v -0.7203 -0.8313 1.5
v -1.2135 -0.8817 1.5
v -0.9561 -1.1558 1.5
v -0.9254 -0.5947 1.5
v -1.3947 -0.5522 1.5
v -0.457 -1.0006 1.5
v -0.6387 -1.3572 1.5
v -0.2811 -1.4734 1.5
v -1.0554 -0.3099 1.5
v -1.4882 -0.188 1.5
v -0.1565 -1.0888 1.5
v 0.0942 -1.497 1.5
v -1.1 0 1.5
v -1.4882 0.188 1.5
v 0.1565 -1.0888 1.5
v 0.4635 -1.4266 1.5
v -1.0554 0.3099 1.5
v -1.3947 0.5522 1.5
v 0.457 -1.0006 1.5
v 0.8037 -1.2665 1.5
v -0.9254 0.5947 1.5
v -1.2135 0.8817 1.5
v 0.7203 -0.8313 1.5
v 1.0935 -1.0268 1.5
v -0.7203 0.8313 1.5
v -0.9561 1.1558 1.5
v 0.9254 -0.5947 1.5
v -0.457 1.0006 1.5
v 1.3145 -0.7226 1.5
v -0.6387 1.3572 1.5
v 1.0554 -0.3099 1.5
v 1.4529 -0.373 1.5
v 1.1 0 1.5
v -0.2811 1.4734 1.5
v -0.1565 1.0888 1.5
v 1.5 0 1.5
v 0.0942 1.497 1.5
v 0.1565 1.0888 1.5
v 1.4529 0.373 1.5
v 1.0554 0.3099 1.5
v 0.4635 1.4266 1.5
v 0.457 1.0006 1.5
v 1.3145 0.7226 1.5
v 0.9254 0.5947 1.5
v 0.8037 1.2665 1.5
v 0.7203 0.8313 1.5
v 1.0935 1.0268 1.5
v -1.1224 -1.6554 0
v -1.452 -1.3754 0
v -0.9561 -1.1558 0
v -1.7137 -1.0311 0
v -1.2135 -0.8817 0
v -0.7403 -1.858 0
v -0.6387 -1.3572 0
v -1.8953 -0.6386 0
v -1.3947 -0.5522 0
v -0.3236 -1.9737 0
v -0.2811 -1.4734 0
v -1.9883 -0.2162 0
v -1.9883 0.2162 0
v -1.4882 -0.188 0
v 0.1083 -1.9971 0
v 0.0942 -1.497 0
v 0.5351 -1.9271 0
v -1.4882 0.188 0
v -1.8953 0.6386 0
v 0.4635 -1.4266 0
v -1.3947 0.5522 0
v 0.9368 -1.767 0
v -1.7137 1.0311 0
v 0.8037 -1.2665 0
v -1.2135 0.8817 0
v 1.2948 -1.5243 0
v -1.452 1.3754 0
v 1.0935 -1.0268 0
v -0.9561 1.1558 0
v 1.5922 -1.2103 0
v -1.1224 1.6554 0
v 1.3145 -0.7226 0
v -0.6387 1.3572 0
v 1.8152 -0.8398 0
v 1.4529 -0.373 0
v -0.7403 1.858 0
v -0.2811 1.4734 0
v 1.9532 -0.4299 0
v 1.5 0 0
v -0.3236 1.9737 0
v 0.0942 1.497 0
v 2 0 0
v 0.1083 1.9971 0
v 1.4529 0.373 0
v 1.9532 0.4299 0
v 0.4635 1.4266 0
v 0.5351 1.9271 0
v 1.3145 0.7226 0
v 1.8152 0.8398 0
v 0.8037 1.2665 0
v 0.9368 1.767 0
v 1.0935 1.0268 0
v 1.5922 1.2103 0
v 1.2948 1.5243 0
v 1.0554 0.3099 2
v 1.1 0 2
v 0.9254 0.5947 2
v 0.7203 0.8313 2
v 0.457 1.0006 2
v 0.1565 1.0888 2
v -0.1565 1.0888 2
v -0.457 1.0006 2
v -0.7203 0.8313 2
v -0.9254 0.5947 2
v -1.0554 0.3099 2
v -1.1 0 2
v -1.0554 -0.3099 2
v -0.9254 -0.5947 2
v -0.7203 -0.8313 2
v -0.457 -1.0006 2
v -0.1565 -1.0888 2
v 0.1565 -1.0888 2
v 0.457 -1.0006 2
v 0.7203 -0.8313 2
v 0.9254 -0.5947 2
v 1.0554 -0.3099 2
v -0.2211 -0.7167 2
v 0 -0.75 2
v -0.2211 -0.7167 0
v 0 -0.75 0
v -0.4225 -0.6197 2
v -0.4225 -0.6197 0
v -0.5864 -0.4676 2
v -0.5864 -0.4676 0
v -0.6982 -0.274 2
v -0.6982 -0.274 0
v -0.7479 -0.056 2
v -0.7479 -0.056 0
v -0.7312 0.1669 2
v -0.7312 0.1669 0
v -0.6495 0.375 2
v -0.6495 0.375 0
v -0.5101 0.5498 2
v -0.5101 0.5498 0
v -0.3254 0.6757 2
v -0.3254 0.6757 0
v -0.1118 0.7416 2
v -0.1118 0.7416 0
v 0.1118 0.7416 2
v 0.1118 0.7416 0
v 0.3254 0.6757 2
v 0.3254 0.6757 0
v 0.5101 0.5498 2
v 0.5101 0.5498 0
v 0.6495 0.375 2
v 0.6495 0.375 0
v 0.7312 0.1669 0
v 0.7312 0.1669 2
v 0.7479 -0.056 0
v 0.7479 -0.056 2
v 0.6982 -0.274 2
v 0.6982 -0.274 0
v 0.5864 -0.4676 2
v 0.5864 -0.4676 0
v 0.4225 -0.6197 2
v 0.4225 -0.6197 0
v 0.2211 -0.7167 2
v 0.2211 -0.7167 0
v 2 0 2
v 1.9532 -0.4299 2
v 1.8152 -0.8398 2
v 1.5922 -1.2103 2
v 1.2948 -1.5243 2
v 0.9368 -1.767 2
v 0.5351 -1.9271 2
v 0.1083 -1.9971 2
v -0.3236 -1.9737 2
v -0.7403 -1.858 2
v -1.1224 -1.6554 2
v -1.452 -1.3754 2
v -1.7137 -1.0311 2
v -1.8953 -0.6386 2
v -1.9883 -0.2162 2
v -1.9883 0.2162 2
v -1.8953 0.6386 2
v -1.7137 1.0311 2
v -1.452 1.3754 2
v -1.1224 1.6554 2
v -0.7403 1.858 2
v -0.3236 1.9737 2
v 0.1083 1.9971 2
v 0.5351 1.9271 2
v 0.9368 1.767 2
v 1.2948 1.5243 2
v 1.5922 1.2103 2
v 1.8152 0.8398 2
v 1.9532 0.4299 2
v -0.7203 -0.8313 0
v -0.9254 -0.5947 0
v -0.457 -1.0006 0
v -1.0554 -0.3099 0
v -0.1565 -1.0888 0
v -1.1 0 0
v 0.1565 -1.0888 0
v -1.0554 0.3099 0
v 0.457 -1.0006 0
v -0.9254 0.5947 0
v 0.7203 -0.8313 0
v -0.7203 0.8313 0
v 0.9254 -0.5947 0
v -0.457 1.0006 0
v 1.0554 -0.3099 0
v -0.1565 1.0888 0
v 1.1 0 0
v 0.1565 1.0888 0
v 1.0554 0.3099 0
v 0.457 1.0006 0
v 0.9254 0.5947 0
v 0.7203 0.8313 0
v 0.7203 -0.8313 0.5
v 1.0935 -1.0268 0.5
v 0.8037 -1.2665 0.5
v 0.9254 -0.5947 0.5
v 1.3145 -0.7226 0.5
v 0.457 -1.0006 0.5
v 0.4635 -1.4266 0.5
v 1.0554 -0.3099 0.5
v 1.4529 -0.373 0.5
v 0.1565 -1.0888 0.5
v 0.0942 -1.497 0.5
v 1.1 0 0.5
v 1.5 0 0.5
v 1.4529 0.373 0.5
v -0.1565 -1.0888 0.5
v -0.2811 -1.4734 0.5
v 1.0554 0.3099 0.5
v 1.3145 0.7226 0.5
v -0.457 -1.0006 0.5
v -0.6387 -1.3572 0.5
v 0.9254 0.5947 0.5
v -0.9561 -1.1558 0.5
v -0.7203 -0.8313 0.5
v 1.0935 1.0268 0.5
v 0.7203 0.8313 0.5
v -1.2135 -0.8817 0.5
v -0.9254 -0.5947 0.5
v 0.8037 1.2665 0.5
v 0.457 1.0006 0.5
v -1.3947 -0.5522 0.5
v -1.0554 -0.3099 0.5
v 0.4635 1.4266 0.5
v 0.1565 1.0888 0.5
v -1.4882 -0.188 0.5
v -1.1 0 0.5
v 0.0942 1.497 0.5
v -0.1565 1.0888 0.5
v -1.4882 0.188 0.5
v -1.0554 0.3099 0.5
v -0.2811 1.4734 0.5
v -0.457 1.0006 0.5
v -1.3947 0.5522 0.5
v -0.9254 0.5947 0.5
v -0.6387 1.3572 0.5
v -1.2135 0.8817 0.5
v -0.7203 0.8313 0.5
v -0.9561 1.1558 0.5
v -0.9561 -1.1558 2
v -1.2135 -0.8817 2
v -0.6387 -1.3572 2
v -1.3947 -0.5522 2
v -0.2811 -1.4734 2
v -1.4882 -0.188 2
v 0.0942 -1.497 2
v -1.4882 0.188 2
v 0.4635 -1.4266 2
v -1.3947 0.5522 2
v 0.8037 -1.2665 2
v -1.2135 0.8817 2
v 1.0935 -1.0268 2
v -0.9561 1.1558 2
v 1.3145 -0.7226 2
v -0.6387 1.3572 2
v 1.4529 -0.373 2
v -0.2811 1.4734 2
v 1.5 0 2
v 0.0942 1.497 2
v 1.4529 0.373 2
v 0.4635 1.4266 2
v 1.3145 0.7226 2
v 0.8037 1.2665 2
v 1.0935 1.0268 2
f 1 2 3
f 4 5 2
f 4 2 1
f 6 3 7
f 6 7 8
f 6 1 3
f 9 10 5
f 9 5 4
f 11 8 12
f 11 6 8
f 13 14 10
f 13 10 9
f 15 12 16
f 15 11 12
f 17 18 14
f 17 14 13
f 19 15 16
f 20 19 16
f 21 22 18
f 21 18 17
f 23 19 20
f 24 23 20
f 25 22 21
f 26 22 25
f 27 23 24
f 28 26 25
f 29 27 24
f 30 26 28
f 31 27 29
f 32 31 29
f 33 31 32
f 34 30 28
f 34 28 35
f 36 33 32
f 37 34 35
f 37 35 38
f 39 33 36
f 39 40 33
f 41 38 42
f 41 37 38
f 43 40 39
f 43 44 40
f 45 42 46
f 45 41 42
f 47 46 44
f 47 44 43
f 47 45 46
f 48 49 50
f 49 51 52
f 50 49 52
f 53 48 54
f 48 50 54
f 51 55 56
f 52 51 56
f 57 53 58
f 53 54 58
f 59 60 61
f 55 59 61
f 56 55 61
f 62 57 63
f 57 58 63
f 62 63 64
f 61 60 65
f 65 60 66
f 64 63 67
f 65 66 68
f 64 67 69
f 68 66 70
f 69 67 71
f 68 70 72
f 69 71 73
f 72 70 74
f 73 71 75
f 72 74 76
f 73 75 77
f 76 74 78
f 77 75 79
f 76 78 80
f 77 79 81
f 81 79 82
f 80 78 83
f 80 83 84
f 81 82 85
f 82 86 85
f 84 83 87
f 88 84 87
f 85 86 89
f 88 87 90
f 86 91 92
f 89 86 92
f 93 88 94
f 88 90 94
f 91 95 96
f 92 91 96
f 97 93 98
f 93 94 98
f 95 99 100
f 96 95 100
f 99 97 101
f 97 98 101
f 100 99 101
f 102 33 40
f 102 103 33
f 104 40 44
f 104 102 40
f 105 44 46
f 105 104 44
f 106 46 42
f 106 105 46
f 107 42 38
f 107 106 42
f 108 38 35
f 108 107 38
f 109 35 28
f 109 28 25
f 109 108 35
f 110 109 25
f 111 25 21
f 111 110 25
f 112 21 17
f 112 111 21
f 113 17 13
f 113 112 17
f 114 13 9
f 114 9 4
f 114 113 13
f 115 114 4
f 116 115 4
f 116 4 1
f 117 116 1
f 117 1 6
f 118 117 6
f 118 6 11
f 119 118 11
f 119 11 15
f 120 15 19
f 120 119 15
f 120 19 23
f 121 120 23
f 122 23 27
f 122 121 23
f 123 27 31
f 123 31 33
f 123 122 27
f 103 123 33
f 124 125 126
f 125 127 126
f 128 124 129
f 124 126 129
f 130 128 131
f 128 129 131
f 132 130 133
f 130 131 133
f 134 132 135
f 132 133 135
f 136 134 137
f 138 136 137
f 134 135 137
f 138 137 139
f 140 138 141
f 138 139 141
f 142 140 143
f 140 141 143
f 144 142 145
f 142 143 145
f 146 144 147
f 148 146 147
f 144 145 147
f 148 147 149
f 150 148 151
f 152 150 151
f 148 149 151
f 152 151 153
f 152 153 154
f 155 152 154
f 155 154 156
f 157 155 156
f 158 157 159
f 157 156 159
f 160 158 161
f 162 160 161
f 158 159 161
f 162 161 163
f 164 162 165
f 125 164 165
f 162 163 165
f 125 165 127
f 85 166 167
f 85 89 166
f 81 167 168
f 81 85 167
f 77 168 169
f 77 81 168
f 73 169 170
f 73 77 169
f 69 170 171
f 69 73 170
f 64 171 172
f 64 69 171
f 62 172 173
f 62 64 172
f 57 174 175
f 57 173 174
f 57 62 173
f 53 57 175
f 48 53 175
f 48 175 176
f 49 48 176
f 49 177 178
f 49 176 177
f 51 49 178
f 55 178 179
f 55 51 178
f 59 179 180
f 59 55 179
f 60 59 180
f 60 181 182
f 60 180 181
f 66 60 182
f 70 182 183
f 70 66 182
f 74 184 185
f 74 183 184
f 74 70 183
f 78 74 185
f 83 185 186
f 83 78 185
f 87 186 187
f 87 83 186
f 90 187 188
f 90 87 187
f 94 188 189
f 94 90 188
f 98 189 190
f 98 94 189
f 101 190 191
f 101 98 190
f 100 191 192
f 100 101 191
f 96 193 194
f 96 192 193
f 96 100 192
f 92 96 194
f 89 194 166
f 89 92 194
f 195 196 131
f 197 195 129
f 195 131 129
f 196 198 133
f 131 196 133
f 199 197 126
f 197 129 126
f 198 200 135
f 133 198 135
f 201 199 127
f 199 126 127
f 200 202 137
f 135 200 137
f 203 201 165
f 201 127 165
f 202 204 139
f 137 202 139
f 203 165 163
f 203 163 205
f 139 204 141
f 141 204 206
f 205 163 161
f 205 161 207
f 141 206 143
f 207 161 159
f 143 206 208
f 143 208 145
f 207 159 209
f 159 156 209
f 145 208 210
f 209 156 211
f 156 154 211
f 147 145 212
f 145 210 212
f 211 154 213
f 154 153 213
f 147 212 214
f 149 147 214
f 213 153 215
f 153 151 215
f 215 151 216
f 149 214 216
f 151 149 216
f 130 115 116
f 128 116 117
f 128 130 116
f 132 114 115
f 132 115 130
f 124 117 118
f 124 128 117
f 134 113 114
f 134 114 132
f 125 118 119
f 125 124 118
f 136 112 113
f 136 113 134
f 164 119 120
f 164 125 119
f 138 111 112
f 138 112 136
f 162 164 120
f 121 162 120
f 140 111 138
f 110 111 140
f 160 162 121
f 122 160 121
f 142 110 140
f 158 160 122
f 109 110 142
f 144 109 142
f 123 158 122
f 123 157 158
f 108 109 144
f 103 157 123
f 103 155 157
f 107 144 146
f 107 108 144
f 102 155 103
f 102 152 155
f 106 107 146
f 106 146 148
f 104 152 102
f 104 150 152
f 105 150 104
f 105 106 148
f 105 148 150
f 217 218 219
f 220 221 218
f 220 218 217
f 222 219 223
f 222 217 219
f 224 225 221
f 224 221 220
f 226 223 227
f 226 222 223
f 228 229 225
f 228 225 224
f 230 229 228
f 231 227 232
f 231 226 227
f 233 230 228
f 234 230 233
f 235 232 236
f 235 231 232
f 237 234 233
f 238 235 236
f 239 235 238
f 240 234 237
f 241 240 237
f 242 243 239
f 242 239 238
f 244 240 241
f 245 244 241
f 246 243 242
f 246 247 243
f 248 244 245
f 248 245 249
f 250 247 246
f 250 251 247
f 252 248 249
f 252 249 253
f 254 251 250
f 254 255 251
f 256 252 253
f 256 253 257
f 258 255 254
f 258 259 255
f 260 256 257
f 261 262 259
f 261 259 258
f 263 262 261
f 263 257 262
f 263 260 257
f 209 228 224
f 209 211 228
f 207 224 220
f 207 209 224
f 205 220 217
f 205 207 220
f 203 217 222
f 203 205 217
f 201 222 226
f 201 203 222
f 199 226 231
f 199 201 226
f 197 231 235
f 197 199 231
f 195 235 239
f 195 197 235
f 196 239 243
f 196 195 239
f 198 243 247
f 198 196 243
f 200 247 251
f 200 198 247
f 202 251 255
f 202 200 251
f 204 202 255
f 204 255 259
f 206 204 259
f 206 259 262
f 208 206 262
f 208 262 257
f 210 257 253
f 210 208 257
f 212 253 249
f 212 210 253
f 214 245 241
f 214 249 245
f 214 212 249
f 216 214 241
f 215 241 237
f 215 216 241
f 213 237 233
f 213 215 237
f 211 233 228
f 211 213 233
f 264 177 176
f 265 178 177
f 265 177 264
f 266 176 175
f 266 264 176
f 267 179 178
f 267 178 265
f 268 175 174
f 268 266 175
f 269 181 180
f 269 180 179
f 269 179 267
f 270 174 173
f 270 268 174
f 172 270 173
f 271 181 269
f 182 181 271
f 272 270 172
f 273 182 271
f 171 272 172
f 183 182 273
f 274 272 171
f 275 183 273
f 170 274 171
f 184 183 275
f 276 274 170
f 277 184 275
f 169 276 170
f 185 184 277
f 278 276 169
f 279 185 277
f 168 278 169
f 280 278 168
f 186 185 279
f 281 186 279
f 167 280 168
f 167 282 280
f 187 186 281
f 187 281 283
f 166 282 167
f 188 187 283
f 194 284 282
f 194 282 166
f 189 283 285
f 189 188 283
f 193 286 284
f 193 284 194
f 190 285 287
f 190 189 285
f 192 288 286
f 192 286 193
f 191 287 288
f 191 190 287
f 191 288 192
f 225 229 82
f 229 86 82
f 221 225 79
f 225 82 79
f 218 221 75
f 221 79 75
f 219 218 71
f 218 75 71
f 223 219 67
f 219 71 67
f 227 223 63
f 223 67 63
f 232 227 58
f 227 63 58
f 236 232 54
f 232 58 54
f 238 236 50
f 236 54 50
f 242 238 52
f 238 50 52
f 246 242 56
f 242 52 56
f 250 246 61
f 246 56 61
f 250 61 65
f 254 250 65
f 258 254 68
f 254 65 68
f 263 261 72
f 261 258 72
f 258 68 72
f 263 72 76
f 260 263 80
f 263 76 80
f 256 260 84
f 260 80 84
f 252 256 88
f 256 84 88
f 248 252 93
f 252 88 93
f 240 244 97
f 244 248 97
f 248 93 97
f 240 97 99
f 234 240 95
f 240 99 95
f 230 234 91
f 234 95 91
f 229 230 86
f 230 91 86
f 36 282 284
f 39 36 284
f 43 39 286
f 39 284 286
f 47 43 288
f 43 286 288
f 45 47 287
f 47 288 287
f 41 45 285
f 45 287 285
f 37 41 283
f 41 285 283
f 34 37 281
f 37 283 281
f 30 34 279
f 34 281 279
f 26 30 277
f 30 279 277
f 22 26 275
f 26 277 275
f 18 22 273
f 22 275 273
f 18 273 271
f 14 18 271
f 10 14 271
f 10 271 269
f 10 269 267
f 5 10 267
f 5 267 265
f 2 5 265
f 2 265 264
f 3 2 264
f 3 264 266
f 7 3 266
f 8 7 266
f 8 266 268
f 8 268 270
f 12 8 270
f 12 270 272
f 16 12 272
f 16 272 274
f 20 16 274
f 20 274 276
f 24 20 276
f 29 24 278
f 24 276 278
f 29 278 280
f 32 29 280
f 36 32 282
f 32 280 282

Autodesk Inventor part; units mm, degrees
ref_plane "YZ Plane" through (0, 0, 0) normal (1, 0, 0) x (0, 1, 0)
ref_plane "XZ Plane" through (0, 0, 0) normal (0, 1, 0) x (-1, 0, 0)
sketch "Sketch1" plane through (0, 0, 0) normal (0, 0, 1) x (1, 0, 0)
  circle A0 centre (0, 0) radius 2
  dimension "d0" = 4
extrude "Extrusion1" add sketch "Sketch1" along normal blind 2
hole "Hole1" at (0, 0, 2) direction (0, 0, -1) diameter 1.5 end through all
sketch "Sketch2" plane through (0, 0, 2) normal (0, 0, 1) x (1, 0, 0)
  circle A0 centre (0, 0) radius 1.5
  circle A1 centre (0, 0) radius 1.1
  dimension "d12" = 3
  dimension "d13" = 2.2
extrude "Extrusion2" cut sketch "Sketch2" against normal blind 0.5
ref_plane "Work Plane1" through (0, 0, 1) normal (0, 0, 1) x (1, 0, 0)
mirror "Mirror1" about plane through (0, 0, 1) normal (0, 0, 1) of "Extrusion2"
properties part number "bearing_1,5x4x2" material "Stainless Steel"
